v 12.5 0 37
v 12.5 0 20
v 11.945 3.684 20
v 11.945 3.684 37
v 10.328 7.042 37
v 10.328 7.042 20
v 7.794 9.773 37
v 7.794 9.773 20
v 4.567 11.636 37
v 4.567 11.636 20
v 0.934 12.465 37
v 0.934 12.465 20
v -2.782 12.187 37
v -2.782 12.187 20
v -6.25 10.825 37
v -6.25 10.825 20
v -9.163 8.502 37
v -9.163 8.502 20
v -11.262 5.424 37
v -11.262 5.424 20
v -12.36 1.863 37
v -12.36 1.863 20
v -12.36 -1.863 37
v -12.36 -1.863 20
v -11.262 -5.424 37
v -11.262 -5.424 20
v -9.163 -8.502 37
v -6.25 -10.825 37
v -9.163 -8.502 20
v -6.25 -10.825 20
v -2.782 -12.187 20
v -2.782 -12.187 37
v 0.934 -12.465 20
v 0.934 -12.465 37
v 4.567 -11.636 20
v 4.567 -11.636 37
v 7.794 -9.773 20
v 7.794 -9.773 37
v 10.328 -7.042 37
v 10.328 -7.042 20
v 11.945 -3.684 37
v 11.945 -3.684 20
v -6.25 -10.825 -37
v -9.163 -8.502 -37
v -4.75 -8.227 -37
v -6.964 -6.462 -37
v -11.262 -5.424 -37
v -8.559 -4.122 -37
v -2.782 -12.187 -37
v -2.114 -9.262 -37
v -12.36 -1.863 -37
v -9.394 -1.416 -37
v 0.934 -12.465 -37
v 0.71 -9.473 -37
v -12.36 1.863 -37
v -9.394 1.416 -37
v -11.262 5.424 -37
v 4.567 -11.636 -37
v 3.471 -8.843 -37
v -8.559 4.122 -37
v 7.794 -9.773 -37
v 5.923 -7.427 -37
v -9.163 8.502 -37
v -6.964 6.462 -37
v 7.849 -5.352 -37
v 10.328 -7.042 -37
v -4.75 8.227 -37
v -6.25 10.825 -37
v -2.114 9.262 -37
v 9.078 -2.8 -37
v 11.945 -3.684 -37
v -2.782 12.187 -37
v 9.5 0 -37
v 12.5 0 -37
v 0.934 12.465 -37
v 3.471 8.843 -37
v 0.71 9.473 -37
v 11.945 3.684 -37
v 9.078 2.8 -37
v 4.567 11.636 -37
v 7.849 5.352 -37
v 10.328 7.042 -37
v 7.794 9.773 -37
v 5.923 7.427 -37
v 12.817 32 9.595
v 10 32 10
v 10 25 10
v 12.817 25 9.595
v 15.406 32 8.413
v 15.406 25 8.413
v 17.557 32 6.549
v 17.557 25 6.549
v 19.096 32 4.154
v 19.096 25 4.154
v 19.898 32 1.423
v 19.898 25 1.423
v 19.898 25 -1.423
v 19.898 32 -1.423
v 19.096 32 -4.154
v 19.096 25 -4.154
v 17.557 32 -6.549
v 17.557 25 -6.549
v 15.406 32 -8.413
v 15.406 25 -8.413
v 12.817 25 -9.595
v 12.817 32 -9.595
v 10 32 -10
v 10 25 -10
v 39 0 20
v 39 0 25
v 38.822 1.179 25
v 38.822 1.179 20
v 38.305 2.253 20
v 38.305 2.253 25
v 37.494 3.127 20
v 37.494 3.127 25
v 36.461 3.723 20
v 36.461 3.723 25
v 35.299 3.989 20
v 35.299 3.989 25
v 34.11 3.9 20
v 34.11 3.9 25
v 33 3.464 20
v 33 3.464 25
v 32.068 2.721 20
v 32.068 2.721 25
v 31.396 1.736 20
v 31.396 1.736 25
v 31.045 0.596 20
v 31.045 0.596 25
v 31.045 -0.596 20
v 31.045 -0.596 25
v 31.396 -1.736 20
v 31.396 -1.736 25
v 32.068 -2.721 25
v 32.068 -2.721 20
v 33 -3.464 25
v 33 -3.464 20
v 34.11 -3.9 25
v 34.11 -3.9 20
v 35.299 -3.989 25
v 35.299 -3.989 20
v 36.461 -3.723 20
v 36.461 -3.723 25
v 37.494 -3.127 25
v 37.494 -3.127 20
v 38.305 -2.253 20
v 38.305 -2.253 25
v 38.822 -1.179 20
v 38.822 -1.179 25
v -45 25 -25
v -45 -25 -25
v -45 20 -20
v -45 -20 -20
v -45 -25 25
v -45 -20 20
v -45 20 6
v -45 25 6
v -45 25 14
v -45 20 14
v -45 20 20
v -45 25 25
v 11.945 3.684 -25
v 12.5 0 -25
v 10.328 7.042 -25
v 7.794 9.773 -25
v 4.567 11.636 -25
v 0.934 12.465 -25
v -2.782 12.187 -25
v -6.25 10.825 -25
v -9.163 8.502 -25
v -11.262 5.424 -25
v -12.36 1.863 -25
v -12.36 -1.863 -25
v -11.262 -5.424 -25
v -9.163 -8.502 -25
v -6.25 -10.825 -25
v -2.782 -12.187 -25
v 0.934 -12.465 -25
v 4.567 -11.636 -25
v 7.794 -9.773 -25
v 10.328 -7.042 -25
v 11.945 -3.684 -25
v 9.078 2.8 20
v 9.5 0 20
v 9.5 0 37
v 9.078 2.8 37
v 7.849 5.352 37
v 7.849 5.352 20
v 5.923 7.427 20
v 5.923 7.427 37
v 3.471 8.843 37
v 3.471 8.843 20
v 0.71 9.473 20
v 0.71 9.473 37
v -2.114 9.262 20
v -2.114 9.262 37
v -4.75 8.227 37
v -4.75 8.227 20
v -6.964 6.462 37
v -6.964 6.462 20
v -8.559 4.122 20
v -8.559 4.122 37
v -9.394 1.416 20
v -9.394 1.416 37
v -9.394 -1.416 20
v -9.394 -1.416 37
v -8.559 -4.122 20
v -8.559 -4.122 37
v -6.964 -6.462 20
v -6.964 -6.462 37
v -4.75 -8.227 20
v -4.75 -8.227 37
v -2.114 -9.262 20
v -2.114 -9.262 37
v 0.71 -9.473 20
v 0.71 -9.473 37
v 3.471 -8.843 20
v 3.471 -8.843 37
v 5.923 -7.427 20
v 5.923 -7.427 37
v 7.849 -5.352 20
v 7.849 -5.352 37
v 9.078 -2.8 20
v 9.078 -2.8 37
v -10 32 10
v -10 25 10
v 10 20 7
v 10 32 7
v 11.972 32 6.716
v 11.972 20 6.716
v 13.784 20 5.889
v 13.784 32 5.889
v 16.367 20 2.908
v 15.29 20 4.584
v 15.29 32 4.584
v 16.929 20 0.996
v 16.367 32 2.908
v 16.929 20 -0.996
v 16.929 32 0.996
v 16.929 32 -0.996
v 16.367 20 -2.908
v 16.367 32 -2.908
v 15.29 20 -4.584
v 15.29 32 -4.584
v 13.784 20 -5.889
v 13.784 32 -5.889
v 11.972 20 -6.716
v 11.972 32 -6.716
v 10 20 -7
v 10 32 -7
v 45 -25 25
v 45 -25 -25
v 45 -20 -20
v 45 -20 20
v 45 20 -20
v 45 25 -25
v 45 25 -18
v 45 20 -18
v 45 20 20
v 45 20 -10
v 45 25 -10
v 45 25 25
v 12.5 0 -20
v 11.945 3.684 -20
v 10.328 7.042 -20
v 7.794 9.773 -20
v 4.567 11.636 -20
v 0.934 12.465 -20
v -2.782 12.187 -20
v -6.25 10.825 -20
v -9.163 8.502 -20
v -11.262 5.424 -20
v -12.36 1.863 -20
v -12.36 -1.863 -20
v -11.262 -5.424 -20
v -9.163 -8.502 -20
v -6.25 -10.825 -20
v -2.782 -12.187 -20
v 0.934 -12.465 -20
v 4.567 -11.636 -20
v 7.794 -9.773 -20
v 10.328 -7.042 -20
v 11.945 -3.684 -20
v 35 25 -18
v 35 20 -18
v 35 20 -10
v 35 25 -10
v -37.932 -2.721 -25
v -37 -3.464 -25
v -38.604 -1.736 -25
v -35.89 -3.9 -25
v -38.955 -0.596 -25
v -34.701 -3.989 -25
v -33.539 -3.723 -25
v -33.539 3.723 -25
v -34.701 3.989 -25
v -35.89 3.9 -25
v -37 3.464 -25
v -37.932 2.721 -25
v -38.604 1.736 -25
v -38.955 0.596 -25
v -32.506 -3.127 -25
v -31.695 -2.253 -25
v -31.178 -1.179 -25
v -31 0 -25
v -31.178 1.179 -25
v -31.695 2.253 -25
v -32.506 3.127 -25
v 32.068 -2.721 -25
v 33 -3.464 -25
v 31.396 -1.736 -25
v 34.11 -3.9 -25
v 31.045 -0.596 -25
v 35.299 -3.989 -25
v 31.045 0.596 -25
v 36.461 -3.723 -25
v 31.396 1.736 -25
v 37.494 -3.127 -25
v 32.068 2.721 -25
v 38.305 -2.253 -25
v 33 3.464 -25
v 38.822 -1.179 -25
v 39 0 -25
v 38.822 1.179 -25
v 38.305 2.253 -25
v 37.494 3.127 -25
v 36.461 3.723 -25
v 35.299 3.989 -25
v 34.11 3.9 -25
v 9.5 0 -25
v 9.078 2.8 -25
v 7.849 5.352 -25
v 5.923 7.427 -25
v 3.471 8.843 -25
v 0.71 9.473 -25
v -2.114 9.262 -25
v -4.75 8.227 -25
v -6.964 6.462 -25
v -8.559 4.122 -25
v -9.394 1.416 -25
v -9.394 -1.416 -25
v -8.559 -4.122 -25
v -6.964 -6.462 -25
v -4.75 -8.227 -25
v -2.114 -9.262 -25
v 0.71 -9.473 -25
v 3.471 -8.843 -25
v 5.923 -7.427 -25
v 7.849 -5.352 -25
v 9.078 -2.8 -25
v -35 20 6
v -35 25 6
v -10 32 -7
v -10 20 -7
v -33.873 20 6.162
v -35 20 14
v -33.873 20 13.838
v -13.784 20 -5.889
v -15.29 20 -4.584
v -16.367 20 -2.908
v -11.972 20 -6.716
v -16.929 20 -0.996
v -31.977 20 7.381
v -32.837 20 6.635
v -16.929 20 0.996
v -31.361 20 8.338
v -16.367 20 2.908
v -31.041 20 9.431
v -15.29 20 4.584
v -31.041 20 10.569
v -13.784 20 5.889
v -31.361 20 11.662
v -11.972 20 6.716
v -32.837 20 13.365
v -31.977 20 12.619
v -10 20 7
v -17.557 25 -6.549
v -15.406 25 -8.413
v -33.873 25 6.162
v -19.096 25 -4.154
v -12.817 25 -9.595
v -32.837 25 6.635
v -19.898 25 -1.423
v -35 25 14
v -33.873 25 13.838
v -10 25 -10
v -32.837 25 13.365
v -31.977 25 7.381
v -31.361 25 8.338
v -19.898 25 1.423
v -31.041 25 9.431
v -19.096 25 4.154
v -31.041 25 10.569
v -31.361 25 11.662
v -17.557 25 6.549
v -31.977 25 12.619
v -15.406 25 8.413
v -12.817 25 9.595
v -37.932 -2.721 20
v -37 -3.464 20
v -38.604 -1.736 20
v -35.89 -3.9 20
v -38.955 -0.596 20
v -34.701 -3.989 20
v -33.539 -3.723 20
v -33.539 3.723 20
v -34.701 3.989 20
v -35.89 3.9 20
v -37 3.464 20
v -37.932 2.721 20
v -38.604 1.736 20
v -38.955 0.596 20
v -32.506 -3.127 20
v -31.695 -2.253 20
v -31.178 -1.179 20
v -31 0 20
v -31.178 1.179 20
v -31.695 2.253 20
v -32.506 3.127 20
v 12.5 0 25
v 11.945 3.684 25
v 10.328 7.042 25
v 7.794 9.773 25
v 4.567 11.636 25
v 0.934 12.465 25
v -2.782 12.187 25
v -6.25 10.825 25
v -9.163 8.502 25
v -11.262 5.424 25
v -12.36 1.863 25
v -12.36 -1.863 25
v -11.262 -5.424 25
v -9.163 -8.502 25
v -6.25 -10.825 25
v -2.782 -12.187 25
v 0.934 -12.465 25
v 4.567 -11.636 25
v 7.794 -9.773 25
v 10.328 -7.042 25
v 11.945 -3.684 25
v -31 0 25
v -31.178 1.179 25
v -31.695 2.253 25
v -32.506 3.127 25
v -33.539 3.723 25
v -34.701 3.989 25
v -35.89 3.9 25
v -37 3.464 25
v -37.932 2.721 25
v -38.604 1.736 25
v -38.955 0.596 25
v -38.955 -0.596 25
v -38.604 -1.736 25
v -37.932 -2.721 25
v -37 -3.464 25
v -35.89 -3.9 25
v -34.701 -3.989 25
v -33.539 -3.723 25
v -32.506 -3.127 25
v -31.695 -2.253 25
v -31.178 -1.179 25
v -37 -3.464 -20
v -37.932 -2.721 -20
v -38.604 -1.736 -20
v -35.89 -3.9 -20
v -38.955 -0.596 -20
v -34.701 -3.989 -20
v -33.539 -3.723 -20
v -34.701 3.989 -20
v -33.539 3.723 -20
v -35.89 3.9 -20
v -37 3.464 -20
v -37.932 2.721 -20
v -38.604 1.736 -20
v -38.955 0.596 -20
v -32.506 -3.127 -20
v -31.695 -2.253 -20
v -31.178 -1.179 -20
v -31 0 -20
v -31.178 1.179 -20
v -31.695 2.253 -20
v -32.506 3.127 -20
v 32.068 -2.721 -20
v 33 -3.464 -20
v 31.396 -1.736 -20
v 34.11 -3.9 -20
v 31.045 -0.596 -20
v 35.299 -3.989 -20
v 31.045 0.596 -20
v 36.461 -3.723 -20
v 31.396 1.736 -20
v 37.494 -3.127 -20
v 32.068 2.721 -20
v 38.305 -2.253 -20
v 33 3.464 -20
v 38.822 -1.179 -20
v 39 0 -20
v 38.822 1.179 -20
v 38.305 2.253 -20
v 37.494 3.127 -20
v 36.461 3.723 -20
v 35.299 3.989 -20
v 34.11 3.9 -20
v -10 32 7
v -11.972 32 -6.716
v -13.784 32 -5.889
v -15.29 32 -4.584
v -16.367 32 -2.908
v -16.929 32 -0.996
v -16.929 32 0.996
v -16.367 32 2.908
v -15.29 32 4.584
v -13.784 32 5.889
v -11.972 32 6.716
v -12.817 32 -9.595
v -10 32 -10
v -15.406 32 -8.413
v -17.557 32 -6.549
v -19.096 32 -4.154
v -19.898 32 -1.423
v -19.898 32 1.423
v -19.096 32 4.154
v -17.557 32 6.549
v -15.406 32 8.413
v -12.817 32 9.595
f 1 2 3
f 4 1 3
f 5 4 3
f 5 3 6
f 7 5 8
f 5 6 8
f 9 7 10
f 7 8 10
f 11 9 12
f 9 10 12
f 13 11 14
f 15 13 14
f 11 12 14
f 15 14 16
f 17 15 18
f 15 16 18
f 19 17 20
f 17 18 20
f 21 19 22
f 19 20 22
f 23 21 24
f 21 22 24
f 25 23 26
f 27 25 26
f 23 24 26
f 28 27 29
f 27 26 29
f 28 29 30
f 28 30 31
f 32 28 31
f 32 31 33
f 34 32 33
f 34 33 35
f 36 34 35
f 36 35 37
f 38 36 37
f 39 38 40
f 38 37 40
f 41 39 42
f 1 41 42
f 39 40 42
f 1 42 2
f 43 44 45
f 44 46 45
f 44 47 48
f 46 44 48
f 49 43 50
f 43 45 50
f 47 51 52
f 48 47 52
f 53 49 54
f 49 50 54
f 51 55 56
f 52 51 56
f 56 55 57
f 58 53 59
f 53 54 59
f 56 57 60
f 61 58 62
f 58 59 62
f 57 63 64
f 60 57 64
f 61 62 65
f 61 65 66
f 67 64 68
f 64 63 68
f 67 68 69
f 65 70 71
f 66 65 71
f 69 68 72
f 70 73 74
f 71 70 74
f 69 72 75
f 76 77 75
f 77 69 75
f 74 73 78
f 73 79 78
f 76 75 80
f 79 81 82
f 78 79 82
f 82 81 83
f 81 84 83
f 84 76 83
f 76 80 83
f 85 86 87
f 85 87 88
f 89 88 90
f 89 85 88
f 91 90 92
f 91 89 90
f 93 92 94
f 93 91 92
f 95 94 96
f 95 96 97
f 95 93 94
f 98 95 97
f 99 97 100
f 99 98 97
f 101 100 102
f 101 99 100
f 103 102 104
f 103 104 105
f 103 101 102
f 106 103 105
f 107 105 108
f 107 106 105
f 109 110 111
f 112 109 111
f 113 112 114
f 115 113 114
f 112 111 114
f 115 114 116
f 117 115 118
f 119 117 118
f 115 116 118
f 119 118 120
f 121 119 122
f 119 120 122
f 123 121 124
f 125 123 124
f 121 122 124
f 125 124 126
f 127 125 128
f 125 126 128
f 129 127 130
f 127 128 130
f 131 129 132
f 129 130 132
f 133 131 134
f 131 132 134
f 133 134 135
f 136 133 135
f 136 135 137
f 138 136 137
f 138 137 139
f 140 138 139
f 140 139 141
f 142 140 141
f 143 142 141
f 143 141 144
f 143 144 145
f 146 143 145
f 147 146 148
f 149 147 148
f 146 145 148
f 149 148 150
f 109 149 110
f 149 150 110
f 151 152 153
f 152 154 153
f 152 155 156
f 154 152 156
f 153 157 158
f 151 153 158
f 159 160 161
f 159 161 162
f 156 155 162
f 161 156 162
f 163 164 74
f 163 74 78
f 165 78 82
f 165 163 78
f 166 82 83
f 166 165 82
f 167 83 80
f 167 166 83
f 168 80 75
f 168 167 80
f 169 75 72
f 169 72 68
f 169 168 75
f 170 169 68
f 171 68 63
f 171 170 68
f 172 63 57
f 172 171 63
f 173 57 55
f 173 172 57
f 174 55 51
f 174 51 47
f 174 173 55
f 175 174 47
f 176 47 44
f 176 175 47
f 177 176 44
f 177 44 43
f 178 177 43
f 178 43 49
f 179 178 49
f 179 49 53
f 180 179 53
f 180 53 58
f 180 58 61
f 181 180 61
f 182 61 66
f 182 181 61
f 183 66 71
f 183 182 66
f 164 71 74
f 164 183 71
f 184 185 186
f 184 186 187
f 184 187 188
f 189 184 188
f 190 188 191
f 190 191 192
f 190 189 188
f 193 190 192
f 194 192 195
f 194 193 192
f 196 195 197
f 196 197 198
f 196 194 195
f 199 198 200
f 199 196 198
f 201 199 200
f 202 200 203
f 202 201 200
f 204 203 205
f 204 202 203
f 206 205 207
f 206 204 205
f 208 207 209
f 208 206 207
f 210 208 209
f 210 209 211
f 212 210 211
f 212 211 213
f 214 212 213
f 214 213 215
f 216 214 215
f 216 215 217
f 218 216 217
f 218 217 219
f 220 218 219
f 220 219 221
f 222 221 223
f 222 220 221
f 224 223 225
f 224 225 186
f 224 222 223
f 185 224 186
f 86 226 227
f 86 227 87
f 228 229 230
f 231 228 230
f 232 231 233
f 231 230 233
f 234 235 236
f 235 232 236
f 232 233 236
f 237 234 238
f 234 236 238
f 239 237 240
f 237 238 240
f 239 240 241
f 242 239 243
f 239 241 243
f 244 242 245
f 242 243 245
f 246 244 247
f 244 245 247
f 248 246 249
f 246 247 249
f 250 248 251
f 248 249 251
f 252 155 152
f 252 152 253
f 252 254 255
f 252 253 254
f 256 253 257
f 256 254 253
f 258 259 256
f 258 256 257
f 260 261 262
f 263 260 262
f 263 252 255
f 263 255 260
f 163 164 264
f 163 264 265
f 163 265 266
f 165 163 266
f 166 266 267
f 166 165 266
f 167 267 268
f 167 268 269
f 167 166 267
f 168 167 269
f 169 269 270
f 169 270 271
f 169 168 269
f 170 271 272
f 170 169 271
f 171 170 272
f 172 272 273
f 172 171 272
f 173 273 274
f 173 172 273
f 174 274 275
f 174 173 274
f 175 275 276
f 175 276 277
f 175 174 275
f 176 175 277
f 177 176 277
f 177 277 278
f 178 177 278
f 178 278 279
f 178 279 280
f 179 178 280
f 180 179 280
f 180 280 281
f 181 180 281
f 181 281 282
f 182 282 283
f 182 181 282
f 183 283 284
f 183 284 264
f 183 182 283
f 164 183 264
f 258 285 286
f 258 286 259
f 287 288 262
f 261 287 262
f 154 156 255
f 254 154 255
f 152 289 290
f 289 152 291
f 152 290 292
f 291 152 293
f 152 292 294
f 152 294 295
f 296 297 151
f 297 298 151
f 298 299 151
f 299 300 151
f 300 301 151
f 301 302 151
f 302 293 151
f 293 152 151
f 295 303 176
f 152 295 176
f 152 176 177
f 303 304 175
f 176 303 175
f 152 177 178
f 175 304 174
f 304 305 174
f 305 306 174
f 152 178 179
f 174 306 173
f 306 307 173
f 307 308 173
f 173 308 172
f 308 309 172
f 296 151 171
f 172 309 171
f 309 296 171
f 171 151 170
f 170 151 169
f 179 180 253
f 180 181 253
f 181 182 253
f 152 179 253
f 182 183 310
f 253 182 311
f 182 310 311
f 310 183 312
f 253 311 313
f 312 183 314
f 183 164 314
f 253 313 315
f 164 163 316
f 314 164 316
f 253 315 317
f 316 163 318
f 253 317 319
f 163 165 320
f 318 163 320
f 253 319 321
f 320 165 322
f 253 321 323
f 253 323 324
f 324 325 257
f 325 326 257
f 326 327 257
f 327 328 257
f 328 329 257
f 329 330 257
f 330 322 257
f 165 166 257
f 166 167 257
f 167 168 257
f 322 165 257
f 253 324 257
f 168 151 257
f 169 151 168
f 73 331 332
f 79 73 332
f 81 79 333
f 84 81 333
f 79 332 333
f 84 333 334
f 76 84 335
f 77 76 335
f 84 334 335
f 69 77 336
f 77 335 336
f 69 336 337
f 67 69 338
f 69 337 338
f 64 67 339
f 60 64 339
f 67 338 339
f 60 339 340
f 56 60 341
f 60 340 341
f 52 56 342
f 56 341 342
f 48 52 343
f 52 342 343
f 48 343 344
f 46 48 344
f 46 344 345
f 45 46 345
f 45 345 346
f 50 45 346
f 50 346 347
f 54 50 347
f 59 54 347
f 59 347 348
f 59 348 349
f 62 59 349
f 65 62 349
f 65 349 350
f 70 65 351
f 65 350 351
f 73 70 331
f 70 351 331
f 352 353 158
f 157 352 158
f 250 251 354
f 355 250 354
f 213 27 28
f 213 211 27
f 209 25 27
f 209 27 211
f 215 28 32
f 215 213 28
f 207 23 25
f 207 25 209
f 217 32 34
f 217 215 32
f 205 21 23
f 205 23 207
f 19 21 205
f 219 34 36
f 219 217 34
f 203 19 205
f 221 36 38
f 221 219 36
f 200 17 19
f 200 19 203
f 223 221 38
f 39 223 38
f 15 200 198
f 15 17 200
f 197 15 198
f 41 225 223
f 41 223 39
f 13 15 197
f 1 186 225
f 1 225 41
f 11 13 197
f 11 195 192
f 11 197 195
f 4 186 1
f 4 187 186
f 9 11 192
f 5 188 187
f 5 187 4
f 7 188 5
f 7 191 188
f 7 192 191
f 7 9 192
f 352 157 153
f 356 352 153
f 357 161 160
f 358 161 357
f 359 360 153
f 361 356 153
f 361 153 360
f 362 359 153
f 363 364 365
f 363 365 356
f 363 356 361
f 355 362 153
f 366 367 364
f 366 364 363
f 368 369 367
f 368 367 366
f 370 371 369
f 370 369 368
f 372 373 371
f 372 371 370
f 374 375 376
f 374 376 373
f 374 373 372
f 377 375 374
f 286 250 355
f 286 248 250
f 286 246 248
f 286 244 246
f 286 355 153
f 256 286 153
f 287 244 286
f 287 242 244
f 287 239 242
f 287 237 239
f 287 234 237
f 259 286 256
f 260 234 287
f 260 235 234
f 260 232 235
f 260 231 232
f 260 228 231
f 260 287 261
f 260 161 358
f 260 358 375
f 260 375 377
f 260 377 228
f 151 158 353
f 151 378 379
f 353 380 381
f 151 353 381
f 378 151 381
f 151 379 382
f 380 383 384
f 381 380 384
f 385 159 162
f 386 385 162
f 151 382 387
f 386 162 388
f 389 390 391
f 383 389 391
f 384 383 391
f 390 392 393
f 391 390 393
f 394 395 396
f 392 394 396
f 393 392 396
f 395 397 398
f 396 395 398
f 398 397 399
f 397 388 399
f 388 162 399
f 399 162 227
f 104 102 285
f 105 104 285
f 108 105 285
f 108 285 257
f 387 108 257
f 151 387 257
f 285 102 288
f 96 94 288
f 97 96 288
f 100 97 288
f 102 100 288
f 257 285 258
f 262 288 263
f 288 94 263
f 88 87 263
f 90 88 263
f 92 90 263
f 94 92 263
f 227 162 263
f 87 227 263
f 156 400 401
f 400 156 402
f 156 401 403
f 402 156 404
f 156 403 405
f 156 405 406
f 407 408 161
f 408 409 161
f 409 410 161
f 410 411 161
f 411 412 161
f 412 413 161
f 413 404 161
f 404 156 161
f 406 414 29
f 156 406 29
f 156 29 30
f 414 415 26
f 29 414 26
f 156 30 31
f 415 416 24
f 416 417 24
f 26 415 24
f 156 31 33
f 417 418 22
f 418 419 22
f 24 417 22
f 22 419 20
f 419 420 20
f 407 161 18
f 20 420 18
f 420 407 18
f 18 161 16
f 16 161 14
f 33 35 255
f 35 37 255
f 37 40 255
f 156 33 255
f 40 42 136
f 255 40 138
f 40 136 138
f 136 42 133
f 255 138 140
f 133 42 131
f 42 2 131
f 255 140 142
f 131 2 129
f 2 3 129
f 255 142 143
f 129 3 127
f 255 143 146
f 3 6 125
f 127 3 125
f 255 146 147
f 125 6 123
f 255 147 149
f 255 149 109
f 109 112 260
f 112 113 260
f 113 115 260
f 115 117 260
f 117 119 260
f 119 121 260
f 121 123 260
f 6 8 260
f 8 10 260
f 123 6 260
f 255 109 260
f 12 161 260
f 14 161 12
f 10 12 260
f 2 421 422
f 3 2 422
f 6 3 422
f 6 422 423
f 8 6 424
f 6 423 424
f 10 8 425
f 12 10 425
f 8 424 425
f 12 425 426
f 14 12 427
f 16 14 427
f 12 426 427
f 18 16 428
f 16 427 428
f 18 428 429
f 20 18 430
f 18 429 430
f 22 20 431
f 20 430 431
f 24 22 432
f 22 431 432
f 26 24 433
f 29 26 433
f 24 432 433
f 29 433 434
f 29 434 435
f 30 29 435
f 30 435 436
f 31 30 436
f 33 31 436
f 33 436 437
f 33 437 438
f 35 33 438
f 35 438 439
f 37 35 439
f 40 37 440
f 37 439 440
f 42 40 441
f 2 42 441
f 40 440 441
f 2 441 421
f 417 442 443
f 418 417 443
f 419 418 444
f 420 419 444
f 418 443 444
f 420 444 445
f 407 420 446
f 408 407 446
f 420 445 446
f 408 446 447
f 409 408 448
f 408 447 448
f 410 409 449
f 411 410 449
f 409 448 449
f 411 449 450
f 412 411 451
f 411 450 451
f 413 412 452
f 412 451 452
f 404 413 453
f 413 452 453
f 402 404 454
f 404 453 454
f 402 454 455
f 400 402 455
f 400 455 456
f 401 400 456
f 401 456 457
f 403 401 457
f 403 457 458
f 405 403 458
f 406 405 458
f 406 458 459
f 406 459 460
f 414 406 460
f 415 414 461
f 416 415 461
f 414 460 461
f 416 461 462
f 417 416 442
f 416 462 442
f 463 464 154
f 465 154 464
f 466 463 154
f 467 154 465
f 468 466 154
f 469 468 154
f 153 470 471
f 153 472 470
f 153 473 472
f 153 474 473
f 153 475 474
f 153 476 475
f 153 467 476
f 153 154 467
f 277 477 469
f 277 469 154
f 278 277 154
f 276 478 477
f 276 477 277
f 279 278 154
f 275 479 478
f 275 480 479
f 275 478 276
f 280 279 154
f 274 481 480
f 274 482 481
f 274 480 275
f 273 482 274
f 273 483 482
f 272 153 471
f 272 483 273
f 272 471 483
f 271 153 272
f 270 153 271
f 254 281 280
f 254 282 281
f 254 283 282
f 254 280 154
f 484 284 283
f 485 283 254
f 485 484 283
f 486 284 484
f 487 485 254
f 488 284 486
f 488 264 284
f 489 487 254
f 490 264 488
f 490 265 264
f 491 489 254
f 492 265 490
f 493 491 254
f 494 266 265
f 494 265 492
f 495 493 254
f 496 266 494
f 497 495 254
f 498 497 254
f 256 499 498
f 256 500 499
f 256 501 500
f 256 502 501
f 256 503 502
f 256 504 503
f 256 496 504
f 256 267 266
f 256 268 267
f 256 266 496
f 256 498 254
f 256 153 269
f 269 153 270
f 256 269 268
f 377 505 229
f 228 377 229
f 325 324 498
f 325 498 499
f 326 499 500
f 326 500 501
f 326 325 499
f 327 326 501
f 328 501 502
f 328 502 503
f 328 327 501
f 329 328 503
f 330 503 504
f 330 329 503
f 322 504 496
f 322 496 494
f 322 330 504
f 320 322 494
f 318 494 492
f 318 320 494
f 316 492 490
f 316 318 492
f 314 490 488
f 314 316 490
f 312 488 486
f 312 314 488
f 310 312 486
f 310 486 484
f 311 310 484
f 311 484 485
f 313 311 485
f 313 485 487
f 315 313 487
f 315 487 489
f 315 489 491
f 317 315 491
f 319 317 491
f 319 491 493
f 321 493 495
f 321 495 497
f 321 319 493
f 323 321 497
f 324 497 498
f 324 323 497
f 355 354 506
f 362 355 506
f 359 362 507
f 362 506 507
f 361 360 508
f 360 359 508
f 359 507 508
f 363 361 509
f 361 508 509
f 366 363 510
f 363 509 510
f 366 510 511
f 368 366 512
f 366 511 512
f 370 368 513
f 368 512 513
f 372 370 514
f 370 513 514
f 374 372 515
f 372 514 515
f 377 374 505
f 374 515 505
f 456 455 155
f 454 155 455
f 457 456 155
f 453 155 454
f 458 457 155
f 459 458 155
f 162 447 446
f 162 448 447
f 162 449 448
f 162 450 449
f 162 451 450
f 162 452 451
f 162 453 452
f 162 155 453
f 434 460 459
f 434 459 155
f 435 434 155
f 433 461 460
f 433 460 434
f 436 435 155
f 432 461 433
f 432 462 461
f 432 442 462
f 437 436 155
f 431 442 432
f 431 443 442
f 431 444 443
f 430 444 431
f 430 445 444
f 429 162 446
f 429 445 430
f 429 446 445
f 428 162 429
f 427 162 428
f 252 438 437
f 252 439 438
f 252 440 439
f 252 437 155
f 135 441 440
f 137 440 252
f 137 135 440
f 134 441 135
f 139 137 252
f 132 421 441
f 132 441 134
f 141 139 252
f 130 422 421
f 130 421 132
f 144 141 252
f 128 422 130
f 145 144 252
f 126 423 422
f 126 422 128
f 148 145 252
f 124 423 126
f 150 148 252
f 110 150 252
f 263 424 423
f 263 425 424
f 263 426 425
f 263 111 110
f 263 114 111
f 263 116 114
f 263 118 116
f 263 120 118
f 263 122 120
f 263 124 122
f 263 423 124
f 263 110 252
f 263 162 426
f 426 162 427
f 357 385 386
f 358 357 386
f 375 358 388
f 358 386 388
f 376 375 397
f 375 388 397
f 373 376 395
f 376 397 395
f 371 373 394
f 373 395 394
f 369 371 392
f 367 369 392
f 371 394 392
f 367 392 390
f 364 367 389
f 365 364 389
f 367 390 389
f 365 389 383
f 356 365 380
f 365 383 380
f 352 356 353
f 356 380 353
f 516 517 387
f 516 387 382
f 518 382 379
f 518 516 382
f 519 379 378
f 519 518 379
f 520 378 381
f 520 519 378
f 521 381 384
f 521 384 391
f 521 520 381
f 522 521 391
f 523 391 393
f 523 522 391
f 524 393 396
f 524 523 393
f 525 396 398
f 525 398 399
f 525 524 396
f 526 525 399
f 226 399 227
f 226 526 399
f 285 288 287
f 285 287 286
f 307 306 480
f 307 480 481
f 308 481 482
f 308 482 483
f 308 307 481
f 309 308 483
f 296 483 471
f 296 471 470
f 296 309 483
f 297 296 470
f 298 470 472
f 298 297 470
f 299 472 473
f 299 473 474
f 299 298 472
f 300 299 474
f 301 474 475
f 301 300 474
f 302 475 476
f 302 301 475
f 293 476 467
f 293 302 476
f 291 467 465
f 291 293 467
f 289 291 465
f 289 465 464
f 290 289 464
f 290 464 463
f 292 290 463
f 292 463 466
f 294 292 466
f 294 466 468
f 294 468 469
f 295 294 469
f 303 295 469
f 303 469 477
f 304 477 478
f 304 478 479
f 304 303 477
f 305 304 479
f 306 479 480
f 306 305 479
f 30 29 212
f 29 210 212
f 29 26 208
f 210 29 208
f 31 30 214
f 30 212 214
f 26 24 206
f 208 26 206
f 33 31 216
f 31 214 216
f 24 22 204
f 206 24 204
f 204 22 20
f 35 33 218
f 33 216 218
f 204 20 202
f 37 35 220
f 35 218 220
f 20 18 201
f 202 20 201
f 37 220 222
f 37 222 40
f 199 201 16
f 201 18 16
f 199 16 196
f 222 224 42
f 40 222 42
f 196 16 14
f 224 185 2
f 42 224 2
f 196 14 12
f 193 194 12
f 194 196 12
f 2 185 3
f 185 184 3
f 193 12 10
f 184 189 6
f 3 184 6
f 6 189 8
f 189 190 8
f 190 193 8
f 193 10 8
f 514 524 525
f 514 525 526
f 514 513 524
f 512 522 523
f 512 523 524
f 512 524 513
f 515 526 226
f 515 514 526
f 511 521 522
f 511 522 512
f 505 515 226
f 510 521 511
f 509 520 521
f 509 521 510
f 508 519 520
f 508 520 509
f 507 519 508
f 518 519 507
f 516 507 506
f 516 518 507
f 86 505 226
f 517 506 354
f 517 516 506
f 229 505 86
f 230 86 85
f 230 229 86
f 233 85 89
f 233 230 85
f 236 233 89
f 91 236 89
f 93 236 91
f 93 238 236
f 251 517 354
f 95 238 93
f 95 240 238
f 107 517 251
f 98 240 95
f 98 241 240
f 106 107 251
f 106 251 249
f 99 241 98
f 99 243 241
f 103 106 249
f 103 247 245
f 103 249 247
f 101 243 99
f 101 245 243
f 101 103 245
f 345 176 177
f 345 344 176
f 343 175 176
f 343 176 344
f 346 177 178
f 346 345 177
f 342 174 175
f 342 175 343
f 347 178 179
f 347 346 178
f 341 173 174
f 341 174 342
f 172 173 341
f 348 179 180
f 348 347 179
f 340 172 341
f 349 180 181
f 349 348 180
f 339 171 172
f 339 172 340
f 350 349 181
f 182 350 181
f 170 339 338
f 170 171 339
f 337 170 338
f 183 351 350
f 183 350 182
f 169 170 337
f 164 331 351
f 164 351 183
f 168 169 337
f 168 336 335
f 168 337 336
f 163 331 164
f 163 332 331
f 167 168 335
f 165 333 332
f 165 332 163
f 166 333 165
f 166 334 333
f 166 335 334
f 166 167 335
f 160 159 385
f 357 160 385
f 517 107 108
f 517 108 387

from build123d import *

# Parameters (mm, degrees)
SKETCH1_W                = 90
SKETCH1_H                = 5
BOSS_EXTRUDE1_DEPTH      = 25
BOSS_EXTRUDE1_2_DEPTH    = 25
EXTRUDE_START            = 25
SKETCH1_3_W              = 80
SKETCH1_3_H              = 40
SKETCH1_3_R              = 4
SKETCH1_3_R_2            = 12.5
EXTRUDE_S_DEPTH          = 5
BOSS_EXTRUDE3_DEPTH      = 12
BOSS_EXTRUDE3_DEPTH_BACK = 5
BOSS_EXTRUDE3_START      = 25
SKETCH1_4_R              = 12.5
SKETCH1_4_R_2            = 9.5
BOSS_EXTRUDE4_START      = 20
BOSS_EXTRUDE4_OUTLINE_W  = 5
BOSS_EXTRUDE4_OUTLINE_H  = 40
BOSS_EXTRUDE4_DEPTH      = 5
BOSS_EXTRUDE5_START      = -25
SKETCH1_6_R              = 12.5
SKETCH1_6_R_2            = 9.5
BOSS_EXTRUDE5_DEPTH      = 12
SKETCH2_W                = 10
SKETCH2_H                = 8
CUT_EXTRUDE1_DEPTH       = 5
BOSS_EXTRUDE6_START      = 7
BOSS_EXTRUDE6_DEPTH      = 7


# Read off the part's stored shape, not the designer's step: Boss-Extrude4
with BuildPart() as part:
    # Sketch1 → Boss-Extrude1 (new, symmetric)
    with BuildSketch(Plane.XY):
        with Locations((0, -22.5)):
            Rectangle(SKETCH1_W, SKETCH1_H)
    extrude(amount=BOSS_EXTRUDE1_DEPTH, both=True)

    # Sketch1<3> → s (add)
    with BuildSketch(Plane.XY.offset(EXTRUDE_START)):
        Rectangle(SKETCH1_3_W, SKETCH1_3_H)
        with Locations((-35, 0)):
            Circle(SKETCH1_3_R, mode=Mode.SUBTRACT)
        Circle(SKETCH1_3_R_2, mode=Mode.SUBTRACT)
        with Locations((35, 0)):
            Circle(SKETCH1_3_R, mode=Mode.SUBTRACT)
    extrude_s = extrude(amount=-EXTRUDE_S_DEPTH)



with BuildPart() as body_2:
    # Sketch1 → Boss-Extrude1 2 (new, symmetric)
    with BuildSketch(Plane.XY):
        with Locations((0, 22.5)):
            Rectangle(SKETCH1_W, SKETCH1_H)
    extrude(amount=BOSS_EXTRUDE1_2_DEPTH, both=True)


with BuildPart() as body_3:
    # Sketch1<4> → Boss-Extrude3 (new, two sides: drawn at the far end of the back side and taken through both)
    with BuildSketch(Plane.XY.offset(BOSS_EXTRUDE3_START - BOSS_EXTRUDE3_DEPTH_BACK)):
        Circle(SKETCH1_4_R)
        Circle(SKETCH1_4_R_2, mode=Mode.SUBTRACT)
    extrude(amount=BOSS_EXTRUDE3_DEPTH + BOSS_EXTRUDE3_DEPTH_BACK)


with BuildPart() as part_1:
    add(part.part)

    add(body_2.part)  # Boss-Extrude4 merges body 2
    # Boss-Extrude4 outline → Boss-Extrude4 (add)
    with BuildSketch(Plane.XY.offset(BOSS_EXTRUDE4_START)):
        with Locations((-42.5, 0)):
            Rectangle(BOSS_EXTRUDE4_OUTLINE_W, BOSS_EXTRUDE4_OUTLINE_H)
        with Locations((42.5, 0)):
            Rectangle(BOSS_EXTRUDE4_OUTLINE_W, BOSS_EXTRUDE4_OUTLINE_H)
    boss_extrude4 = extrude(amount=BOSS_EXTRUDE4_DEPTH)

    # Mirror3: s, Boss-Extrude4 across plane
    add(extrude_s.mirror(Plane.XY))
    add(boss_extrude4.mirror(Plane.XY))

    # Sketch2 → Cut-Extrude1 (cut)
    with BuildSketch(Plane(origin=(0, 25, 0), x_dir=(1, 0, 0), z_dir=(0, 1, 0))):
        with BuildLine():
            Line((-35, -6), (-45, -6))
            Line((-45, -6), (-45, -14))
            Line((-45, -14), (-35, -14))
            ThreePointArc((-35, -14), (-31, -10), (-35, -6))
        make_face()
        with Locations((40, 14)):
            Rectangle(SKETCH2_W, SKETCH2_H)
        with BuildLine():
            Line((-10, 7), (10, 7))
            ThreePointArc((10, 7), (17, 0), (10, -7))
            Line((10, -7), (-10, -7))
            ThreePointArc((-10, -7), (-17, 0), (-10, 7))
        make_face()
    extrude(amount=-CUT_EXTRUDE1_DEPTH, mode=Mode.SUBTRACT)

    # Sketch2<3> → Boss-Extrude6 (add)
    with BuildSketch(Plane(origin=(0, 25, 0), x_dir=(1, 0, 0), z_dir=(0, 1, 0)).offset(BOSS_EXTRUDE6_START)):
        with BuildLine():
            Line((-10, -10), (10, -10))
            ThreePointArc((10, -10), (20, 0), (10, 10))
            Line((10, 10), (-10, 10))
            ThreePointArc((-10, 10), (-20, 0), (-10, -10))
        make_face()
        with BuildLine():
            ThreePointArc((-10, 7), (-17, 0), (-10, -7))
            Line((-10, -7), (10, -7))
            ThreePointArc((10, -7), (17, 0), (10, 7))
            Line((10, 7), (-10, 7))
        make_face(mode=Mode.SUBTRACT)
    extrude(amount=-BOSS_EXTRUDE6_DEPTH)


with BuildPart() as body_3_2:
    # Sketch1<6> → Boss-Extrude5 (new body)
    with BuildSketch(Plane.XY.offset(BOSS_EXTRUDE5_START)):
        Circle(SKETCH1_6_R)
        Circle(SKETCH1_6_R_2, mode=Mode.SUBTRACT)
    extrude(amount=-BOSS_EXTRUDE5_DEPTH)


solid = Compound([body_3.part, part_1.part, body_3_2.part])
